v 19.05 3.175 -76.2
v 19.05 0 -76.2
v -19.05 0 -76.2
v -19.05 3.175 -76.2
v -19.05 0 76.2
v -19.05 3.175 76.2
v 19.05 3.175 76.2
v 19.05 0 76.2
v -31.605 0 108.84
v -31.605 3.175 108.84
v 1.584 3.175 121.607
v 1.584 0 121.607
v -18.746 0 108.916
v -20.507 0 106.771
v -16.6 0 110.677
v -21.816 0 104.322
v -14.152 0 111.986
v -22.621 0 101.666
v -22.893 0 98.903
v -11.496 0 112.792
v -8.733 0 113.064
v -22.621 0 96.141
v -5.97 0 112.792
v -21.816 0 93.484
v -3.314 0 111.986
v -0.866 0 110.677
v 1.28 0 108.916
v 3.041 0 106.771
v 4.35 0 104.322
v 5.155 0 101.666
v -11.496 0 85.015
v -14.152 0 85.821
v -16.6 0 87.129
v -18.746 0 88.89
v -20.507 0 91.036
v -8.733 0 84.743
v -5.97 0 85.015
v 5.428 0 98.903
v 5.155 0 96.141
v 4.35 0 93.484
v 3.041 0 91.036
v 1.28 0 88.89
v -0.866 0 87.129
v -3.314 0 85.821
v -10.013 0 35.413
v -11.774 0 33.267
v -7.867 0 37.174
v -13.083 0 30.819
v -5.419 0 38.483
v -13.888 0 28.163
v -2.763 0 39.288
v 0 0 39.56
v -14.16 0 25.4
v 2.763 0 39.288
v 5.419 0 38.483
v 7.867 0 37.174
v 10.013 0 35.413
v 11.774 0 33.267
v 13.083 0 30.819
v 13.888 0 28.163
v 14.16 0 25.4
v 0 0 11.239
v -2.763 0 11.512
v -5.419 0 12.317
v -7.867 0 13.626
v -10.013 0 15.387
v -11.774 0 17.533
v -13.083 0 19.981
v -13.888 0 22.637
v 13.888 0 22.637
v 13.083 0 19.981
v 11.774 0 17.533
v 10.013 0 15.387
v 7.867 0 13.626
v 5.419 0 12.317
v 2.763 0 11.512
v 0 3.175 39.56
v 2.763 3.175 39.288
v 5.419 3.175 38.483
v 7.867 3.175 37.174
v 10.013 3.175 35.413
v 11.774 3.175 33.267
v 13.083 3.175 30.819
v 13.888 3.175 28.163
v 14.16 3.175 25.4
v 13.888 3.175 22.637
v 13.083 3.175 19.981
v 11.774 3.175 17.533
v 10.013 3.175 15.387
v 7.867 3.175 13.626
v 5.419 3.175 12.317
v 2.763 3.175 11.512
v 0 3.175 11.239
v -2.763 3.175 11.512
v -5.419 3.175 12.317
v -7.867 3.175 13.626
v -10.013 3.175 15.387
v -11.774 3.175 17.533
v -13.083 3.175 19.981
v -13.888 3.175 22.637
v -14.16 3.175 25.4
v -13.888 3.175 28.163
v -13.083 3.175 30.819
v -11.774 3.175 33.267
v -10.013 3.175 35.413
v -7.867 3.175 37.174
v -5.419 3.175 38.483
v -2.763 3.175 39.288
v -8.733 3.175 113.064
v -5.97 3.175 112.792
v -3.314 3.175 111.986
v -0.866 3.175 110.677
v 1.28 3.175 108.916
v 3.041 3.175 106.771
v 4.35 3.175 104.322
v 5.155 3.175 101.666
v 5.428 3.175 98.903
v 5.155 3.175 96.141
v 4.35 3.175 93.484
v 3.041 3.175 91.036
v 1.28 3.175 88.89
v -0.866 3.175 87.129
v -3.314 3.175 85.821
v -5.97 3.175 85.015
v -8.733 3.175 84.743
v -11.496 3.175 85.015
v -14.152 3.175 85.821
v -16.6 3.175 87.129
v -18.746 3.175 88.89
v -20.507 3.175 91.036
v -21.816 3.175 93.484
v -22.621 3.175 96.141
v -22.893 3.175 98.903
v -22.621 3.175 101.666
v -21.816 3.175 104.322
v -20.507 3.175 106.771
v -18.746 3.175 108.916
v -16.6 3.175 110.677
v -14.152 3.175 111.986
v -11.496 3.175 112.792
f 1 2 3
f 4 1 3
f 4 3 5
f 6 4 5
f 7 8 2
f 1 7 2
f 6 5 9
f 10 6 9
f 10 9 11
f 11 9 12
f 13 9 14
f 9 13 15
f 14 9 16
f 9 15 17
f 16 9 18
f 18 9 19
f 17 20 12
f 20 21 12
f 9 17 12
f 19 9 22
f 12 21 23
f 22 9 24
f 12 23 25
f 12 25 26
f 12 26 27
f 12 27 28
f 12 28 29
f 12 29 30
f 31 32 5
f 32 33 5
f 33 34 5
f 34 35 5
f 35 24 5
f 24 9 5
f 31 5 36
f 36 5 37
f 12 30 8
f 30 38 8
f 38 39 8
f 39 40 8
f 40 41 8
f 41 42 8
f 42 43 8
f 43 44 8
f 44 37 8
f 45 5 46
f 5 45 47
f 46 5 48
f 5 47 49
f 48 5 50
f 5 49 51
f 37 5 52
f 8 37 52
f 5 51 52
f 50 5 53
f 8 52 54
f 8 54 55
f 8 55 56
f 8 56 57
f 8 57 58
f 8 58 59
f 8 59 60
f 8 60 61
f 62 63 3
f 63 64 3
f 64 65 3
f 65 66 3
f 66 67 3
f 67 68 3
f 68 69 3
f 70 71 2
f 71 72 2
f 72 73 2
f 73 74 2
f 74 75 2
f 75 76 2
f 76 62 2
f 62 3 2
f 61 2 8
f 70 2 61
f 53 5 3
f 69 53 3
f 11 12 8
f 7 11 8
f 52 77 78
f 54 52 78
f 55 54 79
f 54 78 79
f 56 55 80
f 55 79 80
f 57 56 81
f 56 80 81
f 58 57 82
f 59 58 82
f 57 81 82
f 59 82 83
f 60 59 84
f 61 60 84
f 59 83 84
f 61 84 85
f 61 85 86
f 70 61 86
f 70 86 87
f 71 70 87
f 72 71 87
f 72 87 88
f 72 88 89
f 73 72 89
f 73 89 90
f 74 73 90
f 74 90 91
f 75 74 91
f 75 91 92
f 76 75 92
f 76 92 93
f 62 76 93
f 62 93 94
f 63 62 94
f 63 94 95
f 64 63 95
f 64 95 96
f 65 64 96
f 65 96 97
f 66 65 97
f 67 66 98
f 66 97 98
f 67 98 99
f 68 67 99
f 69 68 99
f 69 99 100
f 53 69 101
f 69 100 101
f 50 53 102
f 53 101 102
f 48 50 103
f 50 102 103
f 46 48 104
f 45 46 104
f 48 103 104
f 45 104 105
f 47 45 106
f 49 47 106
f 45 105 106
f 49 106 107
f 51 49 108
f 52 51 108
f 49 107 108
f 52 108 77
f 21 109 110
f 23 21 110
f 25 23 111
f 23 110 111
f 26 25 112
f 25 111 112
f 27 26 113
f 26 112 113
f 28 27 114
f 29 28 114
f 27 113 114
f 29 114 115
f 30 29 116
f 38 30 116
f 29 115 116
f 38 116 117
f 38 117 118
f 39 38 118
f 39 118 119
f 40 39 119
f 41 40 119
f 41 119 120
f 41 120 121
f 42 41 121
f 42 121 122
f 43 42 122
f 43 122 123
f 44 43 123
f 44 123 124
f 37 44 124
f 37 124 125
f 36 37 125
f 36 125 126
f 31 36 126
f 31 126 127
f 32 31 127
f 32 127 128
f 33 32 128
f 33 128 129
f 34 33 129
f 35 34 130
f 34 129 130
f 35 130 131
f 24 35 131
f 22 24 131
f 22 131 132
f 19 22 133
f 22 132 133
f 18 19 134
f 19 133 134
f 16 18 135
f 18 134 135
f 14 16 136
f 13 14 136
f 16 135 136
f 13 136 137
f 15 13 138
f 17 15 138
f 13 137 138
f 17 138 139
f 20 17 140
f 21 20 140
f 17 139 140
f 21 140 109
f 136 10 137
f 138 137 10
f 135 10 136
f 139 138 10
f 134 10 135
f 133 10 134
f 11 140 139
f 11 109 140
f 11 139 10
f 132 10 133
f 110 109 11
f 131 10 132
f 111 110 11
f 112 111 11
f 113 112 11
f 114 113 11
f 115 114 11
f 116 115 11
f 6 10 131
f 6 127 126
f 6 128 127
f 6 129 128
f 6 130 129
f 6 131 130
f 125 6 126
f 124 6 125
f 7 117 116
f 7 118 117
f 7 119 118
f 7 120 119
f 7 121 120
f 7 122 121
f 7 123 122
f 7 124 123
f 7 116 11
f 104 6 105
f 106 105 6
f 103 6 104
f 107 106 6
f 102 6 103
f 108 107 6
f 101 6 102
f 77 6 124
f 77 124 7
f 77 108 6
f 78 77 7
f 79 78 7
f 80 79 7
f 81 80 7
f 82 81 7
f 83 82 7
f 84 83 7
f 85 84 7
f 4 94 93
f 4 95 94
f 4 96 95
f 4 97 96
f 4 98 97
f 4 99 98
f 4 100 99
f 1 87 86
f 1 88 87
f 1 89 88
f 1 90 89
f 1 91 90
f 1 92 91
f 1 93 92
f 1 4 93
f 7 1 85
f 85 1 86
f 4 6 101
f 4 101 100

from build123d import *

# Parameters (mm, degrees)
BOSS_EXTRUDE1_DEPTH = 3.175
SKETCH2_R           = 14.1605
CUT_EXTRUDE1_DEPTH  = 126.68689151
SKETCH3_R           = 14.1605
CUT_EXTRUDE2_DEPTH  = 126.68689151


with BuildPart() as part:
    # Sketch1 → Boss-Extrude1 (new body)
    with BuildSketch(Plane(origin=(0, 0, 0), x_dir=(1, 0, 0), z_dir=(0, 1, 0))):
        Polygon((-19.05, -76.2), (-31.605279538, -108.840396317), (1.584053795, -121.606827019), (19.05, -76.2), (19.05, 76.2), (-19.05, 76.2), align=None)
    extrude(amount=BOSS_EXTRUDE1_DEPTH)

    # Sketch2 → Cut-Extrude1 (cut, through all)
    with BuildSketch(Plane(origin=(0, 3.175, 0), x_dir=(1, 0, 0), z_dir=(0, 1, 0))):
        with Locations(Location((-8.732973102, -98.90341351, 0), (0, 0, 270))):
            Circle(SKETCH2_R)
    extrude(amount=-CUT_EXTRUDE1_DEPTH, mode=Mode.SUBTRACT)

    # Sketch3 → Cut-Extrude2 (cut, through all)
    with BuildSketch(Plane(origin=(0, 3.175, 0), x_dir=(1, 0, 0), z_dir=(0, 1, 0))):
        with Locations(Location((0, -25.4, 0), (0, 0, 270))):
            Circle(SKETCH3_R)
    extrude(amount=-CUT_EXTRUDE2_DEPTH, mode=Mode.SUBTRACT)


solid = part.part
